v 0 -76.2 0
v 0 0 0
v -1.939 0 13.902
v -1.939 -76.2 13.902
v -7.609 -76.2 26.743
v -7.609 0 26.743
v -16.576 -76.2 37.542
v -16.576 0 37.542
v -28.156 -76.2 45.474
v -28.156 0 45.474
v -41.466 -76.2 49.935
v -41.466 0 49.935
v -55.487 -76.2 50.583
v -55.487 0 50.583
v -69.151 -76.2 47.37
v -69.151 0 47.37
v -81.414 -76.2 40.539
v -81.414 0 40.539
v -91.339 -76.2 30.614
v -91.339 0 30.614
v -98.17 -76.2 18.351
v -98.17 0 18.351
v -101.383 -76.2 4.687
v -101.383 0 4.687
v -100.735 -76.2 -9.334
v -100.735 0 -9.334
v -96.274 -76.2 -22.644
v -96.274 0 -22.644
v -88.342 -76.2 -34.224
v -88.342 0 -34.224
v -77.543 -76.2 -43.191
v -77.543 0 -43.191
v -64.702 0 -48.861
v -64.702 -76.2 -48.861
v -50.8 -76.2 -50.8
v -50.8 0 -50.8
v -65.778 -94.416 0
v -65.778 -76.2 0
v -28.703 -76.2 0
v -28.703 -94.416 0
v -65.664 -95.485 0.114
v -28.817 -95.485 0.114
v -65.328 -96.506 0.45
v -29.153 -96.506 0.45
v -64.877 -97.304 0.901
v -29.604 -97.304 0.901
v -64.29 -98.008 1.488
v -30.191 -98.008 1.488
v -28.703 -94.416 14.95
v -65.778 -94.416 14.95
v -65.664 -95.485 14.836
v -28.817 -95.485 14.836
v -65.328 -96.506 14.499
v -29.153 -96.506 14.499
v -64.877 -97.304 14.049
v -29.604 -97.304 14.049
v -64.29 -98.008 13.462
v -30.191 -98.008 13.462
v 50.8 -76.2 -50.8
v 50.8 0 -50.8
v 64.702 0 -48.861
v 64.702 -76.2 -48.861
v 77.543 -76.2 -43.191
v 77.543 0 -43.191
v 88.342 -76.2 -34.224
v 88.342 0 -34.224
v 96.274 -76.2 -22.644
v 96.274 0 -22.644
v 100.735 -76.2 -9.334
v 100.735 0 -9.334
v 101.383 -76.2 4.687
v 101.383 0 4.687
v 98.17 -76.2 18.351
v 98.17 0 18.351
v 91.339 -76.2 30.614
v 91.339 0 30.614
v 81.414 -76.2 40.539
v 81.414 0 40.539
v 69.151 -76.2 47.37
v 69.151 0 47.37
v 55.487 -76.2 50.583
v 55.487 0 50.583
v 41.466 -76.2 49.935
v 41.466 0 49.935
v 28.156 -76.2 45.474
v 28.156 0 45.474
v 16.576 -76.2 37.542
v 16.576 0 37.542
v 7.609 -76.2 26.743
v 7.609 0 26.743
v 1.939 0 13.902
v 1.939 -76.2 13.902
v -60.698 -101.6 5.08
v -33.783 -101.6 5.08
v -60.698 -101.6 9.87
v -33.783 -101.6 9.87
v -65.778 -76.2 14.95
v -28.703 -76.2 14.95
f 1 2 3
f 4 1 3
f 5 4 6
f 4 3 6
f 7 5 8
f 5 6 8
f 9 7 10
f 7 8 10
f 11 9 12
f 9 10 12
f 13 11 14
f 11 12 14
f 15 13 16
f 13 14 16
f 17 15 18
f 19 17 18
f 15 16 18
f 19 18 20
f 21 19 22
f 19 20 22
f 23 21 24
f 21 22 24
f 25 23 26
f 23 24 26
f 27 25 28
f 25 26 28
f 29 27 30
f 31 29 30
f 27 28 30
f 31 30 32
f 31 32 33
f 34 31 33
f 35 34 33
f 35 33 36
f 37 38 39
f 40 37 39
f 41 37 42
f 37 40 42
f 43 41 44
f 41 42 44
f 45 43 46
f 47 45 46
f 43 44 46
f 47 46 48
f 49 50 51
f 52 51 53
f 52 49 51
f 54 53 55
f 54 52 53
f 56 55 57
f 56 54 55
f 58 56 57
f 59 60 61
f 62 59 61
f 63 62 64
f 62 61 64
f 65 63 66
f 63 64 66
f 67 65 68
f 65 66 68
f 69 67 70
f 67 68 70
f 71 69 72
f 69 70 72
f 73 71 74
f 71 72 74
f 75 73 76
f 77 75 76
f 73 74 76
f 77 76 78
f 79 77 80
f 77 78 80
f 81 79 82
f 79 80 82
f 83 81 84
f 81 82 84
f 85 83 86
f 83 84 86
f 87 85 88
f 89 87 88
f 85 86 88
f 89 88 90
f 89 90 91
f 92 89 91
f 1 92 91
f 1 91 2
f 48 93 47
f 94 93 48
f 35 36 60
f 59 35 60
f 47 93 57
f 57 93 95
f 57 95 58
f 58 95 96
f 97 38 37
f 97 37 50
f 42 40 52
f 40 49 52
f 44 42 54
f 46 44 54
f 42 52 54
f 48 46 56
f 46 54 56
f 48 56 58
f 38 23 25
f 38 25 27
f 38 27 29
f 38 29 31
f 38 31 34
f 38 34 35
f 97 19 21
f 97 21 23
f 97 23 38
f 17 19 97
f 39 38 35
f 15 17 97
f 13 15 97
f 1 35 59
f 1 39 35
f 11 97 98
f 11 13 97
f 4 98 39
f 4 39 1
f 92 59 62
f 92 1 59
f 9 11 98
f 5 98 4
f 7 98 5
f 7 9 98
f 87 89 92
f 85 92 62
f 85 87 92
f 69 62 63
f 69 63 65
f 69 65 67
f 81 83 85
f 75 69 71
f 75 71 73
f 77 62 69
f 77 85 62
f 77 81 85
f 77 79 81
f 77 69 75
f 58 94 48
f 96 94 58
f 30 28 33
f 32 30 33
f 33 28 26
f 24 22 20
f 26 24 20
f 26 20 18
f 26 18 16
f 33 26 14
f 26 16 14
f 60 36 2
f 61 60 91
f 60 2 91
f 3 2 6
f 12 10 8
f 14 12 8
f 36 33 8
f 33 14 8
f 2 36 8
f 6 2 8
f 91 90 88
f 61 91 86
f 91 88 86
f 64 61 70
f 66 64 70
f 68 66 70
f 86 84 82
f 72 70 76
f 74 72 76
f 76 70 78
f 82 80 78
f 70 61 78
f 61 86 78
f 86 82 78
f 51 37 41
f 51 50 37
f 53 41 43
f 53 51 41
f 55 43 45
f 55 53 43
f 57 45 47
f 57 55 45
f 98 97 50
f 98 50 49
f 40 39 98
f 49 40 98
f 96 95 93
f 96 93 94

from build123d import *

# Parameters (mm, degrees)
F1_DEPTH = 76.2
F2_W     = 37.0748843998
F2_H     = 14.9495508522
F3_DEPTH = 25.4
F4_SIZE  = 5.08
F5_R     = 5.08


with BuildPart() as f1:
    # F0 (on Front) → F1 (new body)
    with BuildSketch(Plane.XZ):
        with BuildLine():
            ThreePointArc((0, 0), (-86.7210244843, 35.9210244843), (-50.8, -50.8))
            Line((-50.8, -50.8), (50.8, -50.8))
            ThreePointArc((50.8, -50.8), (86.7210244843, 35.9210244843), (0, 0))
        make_face()
    extrude(amount=F1_DEPTH)

    # F2 (on face) → F3 (join)
    with BuildSketch(Plane.XZ.offset(76.2)):
        with Locations((-47.2405822948, 7.4747754261)):
            Rectangle(F2_W, F2_H)
    extrude(amount=F3_DEPTH)

    # F4
    f4_edges = [f1.edges().sort_by_distance(p)[0] for p in [
        (-47.240582, -101.6, 14.949551),
        (-65.778024, -101.6, 7.474775),
        (-47.240582, -101.6, 0),
        (-28.70314, -101.6, 7.474775),
    ]]
    chamfer(f4_edges, length=F4_SIZE)

    # F5
    f5_edges = [f1.edges().sort_by_distance(p)[0] for p in [
        (-47.240582, -96.52, 0),
        (-65.778024, -96.52, 7.474775),
        (-47.240582, -96.52, 14.949551),
        (-28.70314, -96.52, 7.474775),
    ]]
    fillet(f5_edges, radius=F5_R)


solid = f1.part
